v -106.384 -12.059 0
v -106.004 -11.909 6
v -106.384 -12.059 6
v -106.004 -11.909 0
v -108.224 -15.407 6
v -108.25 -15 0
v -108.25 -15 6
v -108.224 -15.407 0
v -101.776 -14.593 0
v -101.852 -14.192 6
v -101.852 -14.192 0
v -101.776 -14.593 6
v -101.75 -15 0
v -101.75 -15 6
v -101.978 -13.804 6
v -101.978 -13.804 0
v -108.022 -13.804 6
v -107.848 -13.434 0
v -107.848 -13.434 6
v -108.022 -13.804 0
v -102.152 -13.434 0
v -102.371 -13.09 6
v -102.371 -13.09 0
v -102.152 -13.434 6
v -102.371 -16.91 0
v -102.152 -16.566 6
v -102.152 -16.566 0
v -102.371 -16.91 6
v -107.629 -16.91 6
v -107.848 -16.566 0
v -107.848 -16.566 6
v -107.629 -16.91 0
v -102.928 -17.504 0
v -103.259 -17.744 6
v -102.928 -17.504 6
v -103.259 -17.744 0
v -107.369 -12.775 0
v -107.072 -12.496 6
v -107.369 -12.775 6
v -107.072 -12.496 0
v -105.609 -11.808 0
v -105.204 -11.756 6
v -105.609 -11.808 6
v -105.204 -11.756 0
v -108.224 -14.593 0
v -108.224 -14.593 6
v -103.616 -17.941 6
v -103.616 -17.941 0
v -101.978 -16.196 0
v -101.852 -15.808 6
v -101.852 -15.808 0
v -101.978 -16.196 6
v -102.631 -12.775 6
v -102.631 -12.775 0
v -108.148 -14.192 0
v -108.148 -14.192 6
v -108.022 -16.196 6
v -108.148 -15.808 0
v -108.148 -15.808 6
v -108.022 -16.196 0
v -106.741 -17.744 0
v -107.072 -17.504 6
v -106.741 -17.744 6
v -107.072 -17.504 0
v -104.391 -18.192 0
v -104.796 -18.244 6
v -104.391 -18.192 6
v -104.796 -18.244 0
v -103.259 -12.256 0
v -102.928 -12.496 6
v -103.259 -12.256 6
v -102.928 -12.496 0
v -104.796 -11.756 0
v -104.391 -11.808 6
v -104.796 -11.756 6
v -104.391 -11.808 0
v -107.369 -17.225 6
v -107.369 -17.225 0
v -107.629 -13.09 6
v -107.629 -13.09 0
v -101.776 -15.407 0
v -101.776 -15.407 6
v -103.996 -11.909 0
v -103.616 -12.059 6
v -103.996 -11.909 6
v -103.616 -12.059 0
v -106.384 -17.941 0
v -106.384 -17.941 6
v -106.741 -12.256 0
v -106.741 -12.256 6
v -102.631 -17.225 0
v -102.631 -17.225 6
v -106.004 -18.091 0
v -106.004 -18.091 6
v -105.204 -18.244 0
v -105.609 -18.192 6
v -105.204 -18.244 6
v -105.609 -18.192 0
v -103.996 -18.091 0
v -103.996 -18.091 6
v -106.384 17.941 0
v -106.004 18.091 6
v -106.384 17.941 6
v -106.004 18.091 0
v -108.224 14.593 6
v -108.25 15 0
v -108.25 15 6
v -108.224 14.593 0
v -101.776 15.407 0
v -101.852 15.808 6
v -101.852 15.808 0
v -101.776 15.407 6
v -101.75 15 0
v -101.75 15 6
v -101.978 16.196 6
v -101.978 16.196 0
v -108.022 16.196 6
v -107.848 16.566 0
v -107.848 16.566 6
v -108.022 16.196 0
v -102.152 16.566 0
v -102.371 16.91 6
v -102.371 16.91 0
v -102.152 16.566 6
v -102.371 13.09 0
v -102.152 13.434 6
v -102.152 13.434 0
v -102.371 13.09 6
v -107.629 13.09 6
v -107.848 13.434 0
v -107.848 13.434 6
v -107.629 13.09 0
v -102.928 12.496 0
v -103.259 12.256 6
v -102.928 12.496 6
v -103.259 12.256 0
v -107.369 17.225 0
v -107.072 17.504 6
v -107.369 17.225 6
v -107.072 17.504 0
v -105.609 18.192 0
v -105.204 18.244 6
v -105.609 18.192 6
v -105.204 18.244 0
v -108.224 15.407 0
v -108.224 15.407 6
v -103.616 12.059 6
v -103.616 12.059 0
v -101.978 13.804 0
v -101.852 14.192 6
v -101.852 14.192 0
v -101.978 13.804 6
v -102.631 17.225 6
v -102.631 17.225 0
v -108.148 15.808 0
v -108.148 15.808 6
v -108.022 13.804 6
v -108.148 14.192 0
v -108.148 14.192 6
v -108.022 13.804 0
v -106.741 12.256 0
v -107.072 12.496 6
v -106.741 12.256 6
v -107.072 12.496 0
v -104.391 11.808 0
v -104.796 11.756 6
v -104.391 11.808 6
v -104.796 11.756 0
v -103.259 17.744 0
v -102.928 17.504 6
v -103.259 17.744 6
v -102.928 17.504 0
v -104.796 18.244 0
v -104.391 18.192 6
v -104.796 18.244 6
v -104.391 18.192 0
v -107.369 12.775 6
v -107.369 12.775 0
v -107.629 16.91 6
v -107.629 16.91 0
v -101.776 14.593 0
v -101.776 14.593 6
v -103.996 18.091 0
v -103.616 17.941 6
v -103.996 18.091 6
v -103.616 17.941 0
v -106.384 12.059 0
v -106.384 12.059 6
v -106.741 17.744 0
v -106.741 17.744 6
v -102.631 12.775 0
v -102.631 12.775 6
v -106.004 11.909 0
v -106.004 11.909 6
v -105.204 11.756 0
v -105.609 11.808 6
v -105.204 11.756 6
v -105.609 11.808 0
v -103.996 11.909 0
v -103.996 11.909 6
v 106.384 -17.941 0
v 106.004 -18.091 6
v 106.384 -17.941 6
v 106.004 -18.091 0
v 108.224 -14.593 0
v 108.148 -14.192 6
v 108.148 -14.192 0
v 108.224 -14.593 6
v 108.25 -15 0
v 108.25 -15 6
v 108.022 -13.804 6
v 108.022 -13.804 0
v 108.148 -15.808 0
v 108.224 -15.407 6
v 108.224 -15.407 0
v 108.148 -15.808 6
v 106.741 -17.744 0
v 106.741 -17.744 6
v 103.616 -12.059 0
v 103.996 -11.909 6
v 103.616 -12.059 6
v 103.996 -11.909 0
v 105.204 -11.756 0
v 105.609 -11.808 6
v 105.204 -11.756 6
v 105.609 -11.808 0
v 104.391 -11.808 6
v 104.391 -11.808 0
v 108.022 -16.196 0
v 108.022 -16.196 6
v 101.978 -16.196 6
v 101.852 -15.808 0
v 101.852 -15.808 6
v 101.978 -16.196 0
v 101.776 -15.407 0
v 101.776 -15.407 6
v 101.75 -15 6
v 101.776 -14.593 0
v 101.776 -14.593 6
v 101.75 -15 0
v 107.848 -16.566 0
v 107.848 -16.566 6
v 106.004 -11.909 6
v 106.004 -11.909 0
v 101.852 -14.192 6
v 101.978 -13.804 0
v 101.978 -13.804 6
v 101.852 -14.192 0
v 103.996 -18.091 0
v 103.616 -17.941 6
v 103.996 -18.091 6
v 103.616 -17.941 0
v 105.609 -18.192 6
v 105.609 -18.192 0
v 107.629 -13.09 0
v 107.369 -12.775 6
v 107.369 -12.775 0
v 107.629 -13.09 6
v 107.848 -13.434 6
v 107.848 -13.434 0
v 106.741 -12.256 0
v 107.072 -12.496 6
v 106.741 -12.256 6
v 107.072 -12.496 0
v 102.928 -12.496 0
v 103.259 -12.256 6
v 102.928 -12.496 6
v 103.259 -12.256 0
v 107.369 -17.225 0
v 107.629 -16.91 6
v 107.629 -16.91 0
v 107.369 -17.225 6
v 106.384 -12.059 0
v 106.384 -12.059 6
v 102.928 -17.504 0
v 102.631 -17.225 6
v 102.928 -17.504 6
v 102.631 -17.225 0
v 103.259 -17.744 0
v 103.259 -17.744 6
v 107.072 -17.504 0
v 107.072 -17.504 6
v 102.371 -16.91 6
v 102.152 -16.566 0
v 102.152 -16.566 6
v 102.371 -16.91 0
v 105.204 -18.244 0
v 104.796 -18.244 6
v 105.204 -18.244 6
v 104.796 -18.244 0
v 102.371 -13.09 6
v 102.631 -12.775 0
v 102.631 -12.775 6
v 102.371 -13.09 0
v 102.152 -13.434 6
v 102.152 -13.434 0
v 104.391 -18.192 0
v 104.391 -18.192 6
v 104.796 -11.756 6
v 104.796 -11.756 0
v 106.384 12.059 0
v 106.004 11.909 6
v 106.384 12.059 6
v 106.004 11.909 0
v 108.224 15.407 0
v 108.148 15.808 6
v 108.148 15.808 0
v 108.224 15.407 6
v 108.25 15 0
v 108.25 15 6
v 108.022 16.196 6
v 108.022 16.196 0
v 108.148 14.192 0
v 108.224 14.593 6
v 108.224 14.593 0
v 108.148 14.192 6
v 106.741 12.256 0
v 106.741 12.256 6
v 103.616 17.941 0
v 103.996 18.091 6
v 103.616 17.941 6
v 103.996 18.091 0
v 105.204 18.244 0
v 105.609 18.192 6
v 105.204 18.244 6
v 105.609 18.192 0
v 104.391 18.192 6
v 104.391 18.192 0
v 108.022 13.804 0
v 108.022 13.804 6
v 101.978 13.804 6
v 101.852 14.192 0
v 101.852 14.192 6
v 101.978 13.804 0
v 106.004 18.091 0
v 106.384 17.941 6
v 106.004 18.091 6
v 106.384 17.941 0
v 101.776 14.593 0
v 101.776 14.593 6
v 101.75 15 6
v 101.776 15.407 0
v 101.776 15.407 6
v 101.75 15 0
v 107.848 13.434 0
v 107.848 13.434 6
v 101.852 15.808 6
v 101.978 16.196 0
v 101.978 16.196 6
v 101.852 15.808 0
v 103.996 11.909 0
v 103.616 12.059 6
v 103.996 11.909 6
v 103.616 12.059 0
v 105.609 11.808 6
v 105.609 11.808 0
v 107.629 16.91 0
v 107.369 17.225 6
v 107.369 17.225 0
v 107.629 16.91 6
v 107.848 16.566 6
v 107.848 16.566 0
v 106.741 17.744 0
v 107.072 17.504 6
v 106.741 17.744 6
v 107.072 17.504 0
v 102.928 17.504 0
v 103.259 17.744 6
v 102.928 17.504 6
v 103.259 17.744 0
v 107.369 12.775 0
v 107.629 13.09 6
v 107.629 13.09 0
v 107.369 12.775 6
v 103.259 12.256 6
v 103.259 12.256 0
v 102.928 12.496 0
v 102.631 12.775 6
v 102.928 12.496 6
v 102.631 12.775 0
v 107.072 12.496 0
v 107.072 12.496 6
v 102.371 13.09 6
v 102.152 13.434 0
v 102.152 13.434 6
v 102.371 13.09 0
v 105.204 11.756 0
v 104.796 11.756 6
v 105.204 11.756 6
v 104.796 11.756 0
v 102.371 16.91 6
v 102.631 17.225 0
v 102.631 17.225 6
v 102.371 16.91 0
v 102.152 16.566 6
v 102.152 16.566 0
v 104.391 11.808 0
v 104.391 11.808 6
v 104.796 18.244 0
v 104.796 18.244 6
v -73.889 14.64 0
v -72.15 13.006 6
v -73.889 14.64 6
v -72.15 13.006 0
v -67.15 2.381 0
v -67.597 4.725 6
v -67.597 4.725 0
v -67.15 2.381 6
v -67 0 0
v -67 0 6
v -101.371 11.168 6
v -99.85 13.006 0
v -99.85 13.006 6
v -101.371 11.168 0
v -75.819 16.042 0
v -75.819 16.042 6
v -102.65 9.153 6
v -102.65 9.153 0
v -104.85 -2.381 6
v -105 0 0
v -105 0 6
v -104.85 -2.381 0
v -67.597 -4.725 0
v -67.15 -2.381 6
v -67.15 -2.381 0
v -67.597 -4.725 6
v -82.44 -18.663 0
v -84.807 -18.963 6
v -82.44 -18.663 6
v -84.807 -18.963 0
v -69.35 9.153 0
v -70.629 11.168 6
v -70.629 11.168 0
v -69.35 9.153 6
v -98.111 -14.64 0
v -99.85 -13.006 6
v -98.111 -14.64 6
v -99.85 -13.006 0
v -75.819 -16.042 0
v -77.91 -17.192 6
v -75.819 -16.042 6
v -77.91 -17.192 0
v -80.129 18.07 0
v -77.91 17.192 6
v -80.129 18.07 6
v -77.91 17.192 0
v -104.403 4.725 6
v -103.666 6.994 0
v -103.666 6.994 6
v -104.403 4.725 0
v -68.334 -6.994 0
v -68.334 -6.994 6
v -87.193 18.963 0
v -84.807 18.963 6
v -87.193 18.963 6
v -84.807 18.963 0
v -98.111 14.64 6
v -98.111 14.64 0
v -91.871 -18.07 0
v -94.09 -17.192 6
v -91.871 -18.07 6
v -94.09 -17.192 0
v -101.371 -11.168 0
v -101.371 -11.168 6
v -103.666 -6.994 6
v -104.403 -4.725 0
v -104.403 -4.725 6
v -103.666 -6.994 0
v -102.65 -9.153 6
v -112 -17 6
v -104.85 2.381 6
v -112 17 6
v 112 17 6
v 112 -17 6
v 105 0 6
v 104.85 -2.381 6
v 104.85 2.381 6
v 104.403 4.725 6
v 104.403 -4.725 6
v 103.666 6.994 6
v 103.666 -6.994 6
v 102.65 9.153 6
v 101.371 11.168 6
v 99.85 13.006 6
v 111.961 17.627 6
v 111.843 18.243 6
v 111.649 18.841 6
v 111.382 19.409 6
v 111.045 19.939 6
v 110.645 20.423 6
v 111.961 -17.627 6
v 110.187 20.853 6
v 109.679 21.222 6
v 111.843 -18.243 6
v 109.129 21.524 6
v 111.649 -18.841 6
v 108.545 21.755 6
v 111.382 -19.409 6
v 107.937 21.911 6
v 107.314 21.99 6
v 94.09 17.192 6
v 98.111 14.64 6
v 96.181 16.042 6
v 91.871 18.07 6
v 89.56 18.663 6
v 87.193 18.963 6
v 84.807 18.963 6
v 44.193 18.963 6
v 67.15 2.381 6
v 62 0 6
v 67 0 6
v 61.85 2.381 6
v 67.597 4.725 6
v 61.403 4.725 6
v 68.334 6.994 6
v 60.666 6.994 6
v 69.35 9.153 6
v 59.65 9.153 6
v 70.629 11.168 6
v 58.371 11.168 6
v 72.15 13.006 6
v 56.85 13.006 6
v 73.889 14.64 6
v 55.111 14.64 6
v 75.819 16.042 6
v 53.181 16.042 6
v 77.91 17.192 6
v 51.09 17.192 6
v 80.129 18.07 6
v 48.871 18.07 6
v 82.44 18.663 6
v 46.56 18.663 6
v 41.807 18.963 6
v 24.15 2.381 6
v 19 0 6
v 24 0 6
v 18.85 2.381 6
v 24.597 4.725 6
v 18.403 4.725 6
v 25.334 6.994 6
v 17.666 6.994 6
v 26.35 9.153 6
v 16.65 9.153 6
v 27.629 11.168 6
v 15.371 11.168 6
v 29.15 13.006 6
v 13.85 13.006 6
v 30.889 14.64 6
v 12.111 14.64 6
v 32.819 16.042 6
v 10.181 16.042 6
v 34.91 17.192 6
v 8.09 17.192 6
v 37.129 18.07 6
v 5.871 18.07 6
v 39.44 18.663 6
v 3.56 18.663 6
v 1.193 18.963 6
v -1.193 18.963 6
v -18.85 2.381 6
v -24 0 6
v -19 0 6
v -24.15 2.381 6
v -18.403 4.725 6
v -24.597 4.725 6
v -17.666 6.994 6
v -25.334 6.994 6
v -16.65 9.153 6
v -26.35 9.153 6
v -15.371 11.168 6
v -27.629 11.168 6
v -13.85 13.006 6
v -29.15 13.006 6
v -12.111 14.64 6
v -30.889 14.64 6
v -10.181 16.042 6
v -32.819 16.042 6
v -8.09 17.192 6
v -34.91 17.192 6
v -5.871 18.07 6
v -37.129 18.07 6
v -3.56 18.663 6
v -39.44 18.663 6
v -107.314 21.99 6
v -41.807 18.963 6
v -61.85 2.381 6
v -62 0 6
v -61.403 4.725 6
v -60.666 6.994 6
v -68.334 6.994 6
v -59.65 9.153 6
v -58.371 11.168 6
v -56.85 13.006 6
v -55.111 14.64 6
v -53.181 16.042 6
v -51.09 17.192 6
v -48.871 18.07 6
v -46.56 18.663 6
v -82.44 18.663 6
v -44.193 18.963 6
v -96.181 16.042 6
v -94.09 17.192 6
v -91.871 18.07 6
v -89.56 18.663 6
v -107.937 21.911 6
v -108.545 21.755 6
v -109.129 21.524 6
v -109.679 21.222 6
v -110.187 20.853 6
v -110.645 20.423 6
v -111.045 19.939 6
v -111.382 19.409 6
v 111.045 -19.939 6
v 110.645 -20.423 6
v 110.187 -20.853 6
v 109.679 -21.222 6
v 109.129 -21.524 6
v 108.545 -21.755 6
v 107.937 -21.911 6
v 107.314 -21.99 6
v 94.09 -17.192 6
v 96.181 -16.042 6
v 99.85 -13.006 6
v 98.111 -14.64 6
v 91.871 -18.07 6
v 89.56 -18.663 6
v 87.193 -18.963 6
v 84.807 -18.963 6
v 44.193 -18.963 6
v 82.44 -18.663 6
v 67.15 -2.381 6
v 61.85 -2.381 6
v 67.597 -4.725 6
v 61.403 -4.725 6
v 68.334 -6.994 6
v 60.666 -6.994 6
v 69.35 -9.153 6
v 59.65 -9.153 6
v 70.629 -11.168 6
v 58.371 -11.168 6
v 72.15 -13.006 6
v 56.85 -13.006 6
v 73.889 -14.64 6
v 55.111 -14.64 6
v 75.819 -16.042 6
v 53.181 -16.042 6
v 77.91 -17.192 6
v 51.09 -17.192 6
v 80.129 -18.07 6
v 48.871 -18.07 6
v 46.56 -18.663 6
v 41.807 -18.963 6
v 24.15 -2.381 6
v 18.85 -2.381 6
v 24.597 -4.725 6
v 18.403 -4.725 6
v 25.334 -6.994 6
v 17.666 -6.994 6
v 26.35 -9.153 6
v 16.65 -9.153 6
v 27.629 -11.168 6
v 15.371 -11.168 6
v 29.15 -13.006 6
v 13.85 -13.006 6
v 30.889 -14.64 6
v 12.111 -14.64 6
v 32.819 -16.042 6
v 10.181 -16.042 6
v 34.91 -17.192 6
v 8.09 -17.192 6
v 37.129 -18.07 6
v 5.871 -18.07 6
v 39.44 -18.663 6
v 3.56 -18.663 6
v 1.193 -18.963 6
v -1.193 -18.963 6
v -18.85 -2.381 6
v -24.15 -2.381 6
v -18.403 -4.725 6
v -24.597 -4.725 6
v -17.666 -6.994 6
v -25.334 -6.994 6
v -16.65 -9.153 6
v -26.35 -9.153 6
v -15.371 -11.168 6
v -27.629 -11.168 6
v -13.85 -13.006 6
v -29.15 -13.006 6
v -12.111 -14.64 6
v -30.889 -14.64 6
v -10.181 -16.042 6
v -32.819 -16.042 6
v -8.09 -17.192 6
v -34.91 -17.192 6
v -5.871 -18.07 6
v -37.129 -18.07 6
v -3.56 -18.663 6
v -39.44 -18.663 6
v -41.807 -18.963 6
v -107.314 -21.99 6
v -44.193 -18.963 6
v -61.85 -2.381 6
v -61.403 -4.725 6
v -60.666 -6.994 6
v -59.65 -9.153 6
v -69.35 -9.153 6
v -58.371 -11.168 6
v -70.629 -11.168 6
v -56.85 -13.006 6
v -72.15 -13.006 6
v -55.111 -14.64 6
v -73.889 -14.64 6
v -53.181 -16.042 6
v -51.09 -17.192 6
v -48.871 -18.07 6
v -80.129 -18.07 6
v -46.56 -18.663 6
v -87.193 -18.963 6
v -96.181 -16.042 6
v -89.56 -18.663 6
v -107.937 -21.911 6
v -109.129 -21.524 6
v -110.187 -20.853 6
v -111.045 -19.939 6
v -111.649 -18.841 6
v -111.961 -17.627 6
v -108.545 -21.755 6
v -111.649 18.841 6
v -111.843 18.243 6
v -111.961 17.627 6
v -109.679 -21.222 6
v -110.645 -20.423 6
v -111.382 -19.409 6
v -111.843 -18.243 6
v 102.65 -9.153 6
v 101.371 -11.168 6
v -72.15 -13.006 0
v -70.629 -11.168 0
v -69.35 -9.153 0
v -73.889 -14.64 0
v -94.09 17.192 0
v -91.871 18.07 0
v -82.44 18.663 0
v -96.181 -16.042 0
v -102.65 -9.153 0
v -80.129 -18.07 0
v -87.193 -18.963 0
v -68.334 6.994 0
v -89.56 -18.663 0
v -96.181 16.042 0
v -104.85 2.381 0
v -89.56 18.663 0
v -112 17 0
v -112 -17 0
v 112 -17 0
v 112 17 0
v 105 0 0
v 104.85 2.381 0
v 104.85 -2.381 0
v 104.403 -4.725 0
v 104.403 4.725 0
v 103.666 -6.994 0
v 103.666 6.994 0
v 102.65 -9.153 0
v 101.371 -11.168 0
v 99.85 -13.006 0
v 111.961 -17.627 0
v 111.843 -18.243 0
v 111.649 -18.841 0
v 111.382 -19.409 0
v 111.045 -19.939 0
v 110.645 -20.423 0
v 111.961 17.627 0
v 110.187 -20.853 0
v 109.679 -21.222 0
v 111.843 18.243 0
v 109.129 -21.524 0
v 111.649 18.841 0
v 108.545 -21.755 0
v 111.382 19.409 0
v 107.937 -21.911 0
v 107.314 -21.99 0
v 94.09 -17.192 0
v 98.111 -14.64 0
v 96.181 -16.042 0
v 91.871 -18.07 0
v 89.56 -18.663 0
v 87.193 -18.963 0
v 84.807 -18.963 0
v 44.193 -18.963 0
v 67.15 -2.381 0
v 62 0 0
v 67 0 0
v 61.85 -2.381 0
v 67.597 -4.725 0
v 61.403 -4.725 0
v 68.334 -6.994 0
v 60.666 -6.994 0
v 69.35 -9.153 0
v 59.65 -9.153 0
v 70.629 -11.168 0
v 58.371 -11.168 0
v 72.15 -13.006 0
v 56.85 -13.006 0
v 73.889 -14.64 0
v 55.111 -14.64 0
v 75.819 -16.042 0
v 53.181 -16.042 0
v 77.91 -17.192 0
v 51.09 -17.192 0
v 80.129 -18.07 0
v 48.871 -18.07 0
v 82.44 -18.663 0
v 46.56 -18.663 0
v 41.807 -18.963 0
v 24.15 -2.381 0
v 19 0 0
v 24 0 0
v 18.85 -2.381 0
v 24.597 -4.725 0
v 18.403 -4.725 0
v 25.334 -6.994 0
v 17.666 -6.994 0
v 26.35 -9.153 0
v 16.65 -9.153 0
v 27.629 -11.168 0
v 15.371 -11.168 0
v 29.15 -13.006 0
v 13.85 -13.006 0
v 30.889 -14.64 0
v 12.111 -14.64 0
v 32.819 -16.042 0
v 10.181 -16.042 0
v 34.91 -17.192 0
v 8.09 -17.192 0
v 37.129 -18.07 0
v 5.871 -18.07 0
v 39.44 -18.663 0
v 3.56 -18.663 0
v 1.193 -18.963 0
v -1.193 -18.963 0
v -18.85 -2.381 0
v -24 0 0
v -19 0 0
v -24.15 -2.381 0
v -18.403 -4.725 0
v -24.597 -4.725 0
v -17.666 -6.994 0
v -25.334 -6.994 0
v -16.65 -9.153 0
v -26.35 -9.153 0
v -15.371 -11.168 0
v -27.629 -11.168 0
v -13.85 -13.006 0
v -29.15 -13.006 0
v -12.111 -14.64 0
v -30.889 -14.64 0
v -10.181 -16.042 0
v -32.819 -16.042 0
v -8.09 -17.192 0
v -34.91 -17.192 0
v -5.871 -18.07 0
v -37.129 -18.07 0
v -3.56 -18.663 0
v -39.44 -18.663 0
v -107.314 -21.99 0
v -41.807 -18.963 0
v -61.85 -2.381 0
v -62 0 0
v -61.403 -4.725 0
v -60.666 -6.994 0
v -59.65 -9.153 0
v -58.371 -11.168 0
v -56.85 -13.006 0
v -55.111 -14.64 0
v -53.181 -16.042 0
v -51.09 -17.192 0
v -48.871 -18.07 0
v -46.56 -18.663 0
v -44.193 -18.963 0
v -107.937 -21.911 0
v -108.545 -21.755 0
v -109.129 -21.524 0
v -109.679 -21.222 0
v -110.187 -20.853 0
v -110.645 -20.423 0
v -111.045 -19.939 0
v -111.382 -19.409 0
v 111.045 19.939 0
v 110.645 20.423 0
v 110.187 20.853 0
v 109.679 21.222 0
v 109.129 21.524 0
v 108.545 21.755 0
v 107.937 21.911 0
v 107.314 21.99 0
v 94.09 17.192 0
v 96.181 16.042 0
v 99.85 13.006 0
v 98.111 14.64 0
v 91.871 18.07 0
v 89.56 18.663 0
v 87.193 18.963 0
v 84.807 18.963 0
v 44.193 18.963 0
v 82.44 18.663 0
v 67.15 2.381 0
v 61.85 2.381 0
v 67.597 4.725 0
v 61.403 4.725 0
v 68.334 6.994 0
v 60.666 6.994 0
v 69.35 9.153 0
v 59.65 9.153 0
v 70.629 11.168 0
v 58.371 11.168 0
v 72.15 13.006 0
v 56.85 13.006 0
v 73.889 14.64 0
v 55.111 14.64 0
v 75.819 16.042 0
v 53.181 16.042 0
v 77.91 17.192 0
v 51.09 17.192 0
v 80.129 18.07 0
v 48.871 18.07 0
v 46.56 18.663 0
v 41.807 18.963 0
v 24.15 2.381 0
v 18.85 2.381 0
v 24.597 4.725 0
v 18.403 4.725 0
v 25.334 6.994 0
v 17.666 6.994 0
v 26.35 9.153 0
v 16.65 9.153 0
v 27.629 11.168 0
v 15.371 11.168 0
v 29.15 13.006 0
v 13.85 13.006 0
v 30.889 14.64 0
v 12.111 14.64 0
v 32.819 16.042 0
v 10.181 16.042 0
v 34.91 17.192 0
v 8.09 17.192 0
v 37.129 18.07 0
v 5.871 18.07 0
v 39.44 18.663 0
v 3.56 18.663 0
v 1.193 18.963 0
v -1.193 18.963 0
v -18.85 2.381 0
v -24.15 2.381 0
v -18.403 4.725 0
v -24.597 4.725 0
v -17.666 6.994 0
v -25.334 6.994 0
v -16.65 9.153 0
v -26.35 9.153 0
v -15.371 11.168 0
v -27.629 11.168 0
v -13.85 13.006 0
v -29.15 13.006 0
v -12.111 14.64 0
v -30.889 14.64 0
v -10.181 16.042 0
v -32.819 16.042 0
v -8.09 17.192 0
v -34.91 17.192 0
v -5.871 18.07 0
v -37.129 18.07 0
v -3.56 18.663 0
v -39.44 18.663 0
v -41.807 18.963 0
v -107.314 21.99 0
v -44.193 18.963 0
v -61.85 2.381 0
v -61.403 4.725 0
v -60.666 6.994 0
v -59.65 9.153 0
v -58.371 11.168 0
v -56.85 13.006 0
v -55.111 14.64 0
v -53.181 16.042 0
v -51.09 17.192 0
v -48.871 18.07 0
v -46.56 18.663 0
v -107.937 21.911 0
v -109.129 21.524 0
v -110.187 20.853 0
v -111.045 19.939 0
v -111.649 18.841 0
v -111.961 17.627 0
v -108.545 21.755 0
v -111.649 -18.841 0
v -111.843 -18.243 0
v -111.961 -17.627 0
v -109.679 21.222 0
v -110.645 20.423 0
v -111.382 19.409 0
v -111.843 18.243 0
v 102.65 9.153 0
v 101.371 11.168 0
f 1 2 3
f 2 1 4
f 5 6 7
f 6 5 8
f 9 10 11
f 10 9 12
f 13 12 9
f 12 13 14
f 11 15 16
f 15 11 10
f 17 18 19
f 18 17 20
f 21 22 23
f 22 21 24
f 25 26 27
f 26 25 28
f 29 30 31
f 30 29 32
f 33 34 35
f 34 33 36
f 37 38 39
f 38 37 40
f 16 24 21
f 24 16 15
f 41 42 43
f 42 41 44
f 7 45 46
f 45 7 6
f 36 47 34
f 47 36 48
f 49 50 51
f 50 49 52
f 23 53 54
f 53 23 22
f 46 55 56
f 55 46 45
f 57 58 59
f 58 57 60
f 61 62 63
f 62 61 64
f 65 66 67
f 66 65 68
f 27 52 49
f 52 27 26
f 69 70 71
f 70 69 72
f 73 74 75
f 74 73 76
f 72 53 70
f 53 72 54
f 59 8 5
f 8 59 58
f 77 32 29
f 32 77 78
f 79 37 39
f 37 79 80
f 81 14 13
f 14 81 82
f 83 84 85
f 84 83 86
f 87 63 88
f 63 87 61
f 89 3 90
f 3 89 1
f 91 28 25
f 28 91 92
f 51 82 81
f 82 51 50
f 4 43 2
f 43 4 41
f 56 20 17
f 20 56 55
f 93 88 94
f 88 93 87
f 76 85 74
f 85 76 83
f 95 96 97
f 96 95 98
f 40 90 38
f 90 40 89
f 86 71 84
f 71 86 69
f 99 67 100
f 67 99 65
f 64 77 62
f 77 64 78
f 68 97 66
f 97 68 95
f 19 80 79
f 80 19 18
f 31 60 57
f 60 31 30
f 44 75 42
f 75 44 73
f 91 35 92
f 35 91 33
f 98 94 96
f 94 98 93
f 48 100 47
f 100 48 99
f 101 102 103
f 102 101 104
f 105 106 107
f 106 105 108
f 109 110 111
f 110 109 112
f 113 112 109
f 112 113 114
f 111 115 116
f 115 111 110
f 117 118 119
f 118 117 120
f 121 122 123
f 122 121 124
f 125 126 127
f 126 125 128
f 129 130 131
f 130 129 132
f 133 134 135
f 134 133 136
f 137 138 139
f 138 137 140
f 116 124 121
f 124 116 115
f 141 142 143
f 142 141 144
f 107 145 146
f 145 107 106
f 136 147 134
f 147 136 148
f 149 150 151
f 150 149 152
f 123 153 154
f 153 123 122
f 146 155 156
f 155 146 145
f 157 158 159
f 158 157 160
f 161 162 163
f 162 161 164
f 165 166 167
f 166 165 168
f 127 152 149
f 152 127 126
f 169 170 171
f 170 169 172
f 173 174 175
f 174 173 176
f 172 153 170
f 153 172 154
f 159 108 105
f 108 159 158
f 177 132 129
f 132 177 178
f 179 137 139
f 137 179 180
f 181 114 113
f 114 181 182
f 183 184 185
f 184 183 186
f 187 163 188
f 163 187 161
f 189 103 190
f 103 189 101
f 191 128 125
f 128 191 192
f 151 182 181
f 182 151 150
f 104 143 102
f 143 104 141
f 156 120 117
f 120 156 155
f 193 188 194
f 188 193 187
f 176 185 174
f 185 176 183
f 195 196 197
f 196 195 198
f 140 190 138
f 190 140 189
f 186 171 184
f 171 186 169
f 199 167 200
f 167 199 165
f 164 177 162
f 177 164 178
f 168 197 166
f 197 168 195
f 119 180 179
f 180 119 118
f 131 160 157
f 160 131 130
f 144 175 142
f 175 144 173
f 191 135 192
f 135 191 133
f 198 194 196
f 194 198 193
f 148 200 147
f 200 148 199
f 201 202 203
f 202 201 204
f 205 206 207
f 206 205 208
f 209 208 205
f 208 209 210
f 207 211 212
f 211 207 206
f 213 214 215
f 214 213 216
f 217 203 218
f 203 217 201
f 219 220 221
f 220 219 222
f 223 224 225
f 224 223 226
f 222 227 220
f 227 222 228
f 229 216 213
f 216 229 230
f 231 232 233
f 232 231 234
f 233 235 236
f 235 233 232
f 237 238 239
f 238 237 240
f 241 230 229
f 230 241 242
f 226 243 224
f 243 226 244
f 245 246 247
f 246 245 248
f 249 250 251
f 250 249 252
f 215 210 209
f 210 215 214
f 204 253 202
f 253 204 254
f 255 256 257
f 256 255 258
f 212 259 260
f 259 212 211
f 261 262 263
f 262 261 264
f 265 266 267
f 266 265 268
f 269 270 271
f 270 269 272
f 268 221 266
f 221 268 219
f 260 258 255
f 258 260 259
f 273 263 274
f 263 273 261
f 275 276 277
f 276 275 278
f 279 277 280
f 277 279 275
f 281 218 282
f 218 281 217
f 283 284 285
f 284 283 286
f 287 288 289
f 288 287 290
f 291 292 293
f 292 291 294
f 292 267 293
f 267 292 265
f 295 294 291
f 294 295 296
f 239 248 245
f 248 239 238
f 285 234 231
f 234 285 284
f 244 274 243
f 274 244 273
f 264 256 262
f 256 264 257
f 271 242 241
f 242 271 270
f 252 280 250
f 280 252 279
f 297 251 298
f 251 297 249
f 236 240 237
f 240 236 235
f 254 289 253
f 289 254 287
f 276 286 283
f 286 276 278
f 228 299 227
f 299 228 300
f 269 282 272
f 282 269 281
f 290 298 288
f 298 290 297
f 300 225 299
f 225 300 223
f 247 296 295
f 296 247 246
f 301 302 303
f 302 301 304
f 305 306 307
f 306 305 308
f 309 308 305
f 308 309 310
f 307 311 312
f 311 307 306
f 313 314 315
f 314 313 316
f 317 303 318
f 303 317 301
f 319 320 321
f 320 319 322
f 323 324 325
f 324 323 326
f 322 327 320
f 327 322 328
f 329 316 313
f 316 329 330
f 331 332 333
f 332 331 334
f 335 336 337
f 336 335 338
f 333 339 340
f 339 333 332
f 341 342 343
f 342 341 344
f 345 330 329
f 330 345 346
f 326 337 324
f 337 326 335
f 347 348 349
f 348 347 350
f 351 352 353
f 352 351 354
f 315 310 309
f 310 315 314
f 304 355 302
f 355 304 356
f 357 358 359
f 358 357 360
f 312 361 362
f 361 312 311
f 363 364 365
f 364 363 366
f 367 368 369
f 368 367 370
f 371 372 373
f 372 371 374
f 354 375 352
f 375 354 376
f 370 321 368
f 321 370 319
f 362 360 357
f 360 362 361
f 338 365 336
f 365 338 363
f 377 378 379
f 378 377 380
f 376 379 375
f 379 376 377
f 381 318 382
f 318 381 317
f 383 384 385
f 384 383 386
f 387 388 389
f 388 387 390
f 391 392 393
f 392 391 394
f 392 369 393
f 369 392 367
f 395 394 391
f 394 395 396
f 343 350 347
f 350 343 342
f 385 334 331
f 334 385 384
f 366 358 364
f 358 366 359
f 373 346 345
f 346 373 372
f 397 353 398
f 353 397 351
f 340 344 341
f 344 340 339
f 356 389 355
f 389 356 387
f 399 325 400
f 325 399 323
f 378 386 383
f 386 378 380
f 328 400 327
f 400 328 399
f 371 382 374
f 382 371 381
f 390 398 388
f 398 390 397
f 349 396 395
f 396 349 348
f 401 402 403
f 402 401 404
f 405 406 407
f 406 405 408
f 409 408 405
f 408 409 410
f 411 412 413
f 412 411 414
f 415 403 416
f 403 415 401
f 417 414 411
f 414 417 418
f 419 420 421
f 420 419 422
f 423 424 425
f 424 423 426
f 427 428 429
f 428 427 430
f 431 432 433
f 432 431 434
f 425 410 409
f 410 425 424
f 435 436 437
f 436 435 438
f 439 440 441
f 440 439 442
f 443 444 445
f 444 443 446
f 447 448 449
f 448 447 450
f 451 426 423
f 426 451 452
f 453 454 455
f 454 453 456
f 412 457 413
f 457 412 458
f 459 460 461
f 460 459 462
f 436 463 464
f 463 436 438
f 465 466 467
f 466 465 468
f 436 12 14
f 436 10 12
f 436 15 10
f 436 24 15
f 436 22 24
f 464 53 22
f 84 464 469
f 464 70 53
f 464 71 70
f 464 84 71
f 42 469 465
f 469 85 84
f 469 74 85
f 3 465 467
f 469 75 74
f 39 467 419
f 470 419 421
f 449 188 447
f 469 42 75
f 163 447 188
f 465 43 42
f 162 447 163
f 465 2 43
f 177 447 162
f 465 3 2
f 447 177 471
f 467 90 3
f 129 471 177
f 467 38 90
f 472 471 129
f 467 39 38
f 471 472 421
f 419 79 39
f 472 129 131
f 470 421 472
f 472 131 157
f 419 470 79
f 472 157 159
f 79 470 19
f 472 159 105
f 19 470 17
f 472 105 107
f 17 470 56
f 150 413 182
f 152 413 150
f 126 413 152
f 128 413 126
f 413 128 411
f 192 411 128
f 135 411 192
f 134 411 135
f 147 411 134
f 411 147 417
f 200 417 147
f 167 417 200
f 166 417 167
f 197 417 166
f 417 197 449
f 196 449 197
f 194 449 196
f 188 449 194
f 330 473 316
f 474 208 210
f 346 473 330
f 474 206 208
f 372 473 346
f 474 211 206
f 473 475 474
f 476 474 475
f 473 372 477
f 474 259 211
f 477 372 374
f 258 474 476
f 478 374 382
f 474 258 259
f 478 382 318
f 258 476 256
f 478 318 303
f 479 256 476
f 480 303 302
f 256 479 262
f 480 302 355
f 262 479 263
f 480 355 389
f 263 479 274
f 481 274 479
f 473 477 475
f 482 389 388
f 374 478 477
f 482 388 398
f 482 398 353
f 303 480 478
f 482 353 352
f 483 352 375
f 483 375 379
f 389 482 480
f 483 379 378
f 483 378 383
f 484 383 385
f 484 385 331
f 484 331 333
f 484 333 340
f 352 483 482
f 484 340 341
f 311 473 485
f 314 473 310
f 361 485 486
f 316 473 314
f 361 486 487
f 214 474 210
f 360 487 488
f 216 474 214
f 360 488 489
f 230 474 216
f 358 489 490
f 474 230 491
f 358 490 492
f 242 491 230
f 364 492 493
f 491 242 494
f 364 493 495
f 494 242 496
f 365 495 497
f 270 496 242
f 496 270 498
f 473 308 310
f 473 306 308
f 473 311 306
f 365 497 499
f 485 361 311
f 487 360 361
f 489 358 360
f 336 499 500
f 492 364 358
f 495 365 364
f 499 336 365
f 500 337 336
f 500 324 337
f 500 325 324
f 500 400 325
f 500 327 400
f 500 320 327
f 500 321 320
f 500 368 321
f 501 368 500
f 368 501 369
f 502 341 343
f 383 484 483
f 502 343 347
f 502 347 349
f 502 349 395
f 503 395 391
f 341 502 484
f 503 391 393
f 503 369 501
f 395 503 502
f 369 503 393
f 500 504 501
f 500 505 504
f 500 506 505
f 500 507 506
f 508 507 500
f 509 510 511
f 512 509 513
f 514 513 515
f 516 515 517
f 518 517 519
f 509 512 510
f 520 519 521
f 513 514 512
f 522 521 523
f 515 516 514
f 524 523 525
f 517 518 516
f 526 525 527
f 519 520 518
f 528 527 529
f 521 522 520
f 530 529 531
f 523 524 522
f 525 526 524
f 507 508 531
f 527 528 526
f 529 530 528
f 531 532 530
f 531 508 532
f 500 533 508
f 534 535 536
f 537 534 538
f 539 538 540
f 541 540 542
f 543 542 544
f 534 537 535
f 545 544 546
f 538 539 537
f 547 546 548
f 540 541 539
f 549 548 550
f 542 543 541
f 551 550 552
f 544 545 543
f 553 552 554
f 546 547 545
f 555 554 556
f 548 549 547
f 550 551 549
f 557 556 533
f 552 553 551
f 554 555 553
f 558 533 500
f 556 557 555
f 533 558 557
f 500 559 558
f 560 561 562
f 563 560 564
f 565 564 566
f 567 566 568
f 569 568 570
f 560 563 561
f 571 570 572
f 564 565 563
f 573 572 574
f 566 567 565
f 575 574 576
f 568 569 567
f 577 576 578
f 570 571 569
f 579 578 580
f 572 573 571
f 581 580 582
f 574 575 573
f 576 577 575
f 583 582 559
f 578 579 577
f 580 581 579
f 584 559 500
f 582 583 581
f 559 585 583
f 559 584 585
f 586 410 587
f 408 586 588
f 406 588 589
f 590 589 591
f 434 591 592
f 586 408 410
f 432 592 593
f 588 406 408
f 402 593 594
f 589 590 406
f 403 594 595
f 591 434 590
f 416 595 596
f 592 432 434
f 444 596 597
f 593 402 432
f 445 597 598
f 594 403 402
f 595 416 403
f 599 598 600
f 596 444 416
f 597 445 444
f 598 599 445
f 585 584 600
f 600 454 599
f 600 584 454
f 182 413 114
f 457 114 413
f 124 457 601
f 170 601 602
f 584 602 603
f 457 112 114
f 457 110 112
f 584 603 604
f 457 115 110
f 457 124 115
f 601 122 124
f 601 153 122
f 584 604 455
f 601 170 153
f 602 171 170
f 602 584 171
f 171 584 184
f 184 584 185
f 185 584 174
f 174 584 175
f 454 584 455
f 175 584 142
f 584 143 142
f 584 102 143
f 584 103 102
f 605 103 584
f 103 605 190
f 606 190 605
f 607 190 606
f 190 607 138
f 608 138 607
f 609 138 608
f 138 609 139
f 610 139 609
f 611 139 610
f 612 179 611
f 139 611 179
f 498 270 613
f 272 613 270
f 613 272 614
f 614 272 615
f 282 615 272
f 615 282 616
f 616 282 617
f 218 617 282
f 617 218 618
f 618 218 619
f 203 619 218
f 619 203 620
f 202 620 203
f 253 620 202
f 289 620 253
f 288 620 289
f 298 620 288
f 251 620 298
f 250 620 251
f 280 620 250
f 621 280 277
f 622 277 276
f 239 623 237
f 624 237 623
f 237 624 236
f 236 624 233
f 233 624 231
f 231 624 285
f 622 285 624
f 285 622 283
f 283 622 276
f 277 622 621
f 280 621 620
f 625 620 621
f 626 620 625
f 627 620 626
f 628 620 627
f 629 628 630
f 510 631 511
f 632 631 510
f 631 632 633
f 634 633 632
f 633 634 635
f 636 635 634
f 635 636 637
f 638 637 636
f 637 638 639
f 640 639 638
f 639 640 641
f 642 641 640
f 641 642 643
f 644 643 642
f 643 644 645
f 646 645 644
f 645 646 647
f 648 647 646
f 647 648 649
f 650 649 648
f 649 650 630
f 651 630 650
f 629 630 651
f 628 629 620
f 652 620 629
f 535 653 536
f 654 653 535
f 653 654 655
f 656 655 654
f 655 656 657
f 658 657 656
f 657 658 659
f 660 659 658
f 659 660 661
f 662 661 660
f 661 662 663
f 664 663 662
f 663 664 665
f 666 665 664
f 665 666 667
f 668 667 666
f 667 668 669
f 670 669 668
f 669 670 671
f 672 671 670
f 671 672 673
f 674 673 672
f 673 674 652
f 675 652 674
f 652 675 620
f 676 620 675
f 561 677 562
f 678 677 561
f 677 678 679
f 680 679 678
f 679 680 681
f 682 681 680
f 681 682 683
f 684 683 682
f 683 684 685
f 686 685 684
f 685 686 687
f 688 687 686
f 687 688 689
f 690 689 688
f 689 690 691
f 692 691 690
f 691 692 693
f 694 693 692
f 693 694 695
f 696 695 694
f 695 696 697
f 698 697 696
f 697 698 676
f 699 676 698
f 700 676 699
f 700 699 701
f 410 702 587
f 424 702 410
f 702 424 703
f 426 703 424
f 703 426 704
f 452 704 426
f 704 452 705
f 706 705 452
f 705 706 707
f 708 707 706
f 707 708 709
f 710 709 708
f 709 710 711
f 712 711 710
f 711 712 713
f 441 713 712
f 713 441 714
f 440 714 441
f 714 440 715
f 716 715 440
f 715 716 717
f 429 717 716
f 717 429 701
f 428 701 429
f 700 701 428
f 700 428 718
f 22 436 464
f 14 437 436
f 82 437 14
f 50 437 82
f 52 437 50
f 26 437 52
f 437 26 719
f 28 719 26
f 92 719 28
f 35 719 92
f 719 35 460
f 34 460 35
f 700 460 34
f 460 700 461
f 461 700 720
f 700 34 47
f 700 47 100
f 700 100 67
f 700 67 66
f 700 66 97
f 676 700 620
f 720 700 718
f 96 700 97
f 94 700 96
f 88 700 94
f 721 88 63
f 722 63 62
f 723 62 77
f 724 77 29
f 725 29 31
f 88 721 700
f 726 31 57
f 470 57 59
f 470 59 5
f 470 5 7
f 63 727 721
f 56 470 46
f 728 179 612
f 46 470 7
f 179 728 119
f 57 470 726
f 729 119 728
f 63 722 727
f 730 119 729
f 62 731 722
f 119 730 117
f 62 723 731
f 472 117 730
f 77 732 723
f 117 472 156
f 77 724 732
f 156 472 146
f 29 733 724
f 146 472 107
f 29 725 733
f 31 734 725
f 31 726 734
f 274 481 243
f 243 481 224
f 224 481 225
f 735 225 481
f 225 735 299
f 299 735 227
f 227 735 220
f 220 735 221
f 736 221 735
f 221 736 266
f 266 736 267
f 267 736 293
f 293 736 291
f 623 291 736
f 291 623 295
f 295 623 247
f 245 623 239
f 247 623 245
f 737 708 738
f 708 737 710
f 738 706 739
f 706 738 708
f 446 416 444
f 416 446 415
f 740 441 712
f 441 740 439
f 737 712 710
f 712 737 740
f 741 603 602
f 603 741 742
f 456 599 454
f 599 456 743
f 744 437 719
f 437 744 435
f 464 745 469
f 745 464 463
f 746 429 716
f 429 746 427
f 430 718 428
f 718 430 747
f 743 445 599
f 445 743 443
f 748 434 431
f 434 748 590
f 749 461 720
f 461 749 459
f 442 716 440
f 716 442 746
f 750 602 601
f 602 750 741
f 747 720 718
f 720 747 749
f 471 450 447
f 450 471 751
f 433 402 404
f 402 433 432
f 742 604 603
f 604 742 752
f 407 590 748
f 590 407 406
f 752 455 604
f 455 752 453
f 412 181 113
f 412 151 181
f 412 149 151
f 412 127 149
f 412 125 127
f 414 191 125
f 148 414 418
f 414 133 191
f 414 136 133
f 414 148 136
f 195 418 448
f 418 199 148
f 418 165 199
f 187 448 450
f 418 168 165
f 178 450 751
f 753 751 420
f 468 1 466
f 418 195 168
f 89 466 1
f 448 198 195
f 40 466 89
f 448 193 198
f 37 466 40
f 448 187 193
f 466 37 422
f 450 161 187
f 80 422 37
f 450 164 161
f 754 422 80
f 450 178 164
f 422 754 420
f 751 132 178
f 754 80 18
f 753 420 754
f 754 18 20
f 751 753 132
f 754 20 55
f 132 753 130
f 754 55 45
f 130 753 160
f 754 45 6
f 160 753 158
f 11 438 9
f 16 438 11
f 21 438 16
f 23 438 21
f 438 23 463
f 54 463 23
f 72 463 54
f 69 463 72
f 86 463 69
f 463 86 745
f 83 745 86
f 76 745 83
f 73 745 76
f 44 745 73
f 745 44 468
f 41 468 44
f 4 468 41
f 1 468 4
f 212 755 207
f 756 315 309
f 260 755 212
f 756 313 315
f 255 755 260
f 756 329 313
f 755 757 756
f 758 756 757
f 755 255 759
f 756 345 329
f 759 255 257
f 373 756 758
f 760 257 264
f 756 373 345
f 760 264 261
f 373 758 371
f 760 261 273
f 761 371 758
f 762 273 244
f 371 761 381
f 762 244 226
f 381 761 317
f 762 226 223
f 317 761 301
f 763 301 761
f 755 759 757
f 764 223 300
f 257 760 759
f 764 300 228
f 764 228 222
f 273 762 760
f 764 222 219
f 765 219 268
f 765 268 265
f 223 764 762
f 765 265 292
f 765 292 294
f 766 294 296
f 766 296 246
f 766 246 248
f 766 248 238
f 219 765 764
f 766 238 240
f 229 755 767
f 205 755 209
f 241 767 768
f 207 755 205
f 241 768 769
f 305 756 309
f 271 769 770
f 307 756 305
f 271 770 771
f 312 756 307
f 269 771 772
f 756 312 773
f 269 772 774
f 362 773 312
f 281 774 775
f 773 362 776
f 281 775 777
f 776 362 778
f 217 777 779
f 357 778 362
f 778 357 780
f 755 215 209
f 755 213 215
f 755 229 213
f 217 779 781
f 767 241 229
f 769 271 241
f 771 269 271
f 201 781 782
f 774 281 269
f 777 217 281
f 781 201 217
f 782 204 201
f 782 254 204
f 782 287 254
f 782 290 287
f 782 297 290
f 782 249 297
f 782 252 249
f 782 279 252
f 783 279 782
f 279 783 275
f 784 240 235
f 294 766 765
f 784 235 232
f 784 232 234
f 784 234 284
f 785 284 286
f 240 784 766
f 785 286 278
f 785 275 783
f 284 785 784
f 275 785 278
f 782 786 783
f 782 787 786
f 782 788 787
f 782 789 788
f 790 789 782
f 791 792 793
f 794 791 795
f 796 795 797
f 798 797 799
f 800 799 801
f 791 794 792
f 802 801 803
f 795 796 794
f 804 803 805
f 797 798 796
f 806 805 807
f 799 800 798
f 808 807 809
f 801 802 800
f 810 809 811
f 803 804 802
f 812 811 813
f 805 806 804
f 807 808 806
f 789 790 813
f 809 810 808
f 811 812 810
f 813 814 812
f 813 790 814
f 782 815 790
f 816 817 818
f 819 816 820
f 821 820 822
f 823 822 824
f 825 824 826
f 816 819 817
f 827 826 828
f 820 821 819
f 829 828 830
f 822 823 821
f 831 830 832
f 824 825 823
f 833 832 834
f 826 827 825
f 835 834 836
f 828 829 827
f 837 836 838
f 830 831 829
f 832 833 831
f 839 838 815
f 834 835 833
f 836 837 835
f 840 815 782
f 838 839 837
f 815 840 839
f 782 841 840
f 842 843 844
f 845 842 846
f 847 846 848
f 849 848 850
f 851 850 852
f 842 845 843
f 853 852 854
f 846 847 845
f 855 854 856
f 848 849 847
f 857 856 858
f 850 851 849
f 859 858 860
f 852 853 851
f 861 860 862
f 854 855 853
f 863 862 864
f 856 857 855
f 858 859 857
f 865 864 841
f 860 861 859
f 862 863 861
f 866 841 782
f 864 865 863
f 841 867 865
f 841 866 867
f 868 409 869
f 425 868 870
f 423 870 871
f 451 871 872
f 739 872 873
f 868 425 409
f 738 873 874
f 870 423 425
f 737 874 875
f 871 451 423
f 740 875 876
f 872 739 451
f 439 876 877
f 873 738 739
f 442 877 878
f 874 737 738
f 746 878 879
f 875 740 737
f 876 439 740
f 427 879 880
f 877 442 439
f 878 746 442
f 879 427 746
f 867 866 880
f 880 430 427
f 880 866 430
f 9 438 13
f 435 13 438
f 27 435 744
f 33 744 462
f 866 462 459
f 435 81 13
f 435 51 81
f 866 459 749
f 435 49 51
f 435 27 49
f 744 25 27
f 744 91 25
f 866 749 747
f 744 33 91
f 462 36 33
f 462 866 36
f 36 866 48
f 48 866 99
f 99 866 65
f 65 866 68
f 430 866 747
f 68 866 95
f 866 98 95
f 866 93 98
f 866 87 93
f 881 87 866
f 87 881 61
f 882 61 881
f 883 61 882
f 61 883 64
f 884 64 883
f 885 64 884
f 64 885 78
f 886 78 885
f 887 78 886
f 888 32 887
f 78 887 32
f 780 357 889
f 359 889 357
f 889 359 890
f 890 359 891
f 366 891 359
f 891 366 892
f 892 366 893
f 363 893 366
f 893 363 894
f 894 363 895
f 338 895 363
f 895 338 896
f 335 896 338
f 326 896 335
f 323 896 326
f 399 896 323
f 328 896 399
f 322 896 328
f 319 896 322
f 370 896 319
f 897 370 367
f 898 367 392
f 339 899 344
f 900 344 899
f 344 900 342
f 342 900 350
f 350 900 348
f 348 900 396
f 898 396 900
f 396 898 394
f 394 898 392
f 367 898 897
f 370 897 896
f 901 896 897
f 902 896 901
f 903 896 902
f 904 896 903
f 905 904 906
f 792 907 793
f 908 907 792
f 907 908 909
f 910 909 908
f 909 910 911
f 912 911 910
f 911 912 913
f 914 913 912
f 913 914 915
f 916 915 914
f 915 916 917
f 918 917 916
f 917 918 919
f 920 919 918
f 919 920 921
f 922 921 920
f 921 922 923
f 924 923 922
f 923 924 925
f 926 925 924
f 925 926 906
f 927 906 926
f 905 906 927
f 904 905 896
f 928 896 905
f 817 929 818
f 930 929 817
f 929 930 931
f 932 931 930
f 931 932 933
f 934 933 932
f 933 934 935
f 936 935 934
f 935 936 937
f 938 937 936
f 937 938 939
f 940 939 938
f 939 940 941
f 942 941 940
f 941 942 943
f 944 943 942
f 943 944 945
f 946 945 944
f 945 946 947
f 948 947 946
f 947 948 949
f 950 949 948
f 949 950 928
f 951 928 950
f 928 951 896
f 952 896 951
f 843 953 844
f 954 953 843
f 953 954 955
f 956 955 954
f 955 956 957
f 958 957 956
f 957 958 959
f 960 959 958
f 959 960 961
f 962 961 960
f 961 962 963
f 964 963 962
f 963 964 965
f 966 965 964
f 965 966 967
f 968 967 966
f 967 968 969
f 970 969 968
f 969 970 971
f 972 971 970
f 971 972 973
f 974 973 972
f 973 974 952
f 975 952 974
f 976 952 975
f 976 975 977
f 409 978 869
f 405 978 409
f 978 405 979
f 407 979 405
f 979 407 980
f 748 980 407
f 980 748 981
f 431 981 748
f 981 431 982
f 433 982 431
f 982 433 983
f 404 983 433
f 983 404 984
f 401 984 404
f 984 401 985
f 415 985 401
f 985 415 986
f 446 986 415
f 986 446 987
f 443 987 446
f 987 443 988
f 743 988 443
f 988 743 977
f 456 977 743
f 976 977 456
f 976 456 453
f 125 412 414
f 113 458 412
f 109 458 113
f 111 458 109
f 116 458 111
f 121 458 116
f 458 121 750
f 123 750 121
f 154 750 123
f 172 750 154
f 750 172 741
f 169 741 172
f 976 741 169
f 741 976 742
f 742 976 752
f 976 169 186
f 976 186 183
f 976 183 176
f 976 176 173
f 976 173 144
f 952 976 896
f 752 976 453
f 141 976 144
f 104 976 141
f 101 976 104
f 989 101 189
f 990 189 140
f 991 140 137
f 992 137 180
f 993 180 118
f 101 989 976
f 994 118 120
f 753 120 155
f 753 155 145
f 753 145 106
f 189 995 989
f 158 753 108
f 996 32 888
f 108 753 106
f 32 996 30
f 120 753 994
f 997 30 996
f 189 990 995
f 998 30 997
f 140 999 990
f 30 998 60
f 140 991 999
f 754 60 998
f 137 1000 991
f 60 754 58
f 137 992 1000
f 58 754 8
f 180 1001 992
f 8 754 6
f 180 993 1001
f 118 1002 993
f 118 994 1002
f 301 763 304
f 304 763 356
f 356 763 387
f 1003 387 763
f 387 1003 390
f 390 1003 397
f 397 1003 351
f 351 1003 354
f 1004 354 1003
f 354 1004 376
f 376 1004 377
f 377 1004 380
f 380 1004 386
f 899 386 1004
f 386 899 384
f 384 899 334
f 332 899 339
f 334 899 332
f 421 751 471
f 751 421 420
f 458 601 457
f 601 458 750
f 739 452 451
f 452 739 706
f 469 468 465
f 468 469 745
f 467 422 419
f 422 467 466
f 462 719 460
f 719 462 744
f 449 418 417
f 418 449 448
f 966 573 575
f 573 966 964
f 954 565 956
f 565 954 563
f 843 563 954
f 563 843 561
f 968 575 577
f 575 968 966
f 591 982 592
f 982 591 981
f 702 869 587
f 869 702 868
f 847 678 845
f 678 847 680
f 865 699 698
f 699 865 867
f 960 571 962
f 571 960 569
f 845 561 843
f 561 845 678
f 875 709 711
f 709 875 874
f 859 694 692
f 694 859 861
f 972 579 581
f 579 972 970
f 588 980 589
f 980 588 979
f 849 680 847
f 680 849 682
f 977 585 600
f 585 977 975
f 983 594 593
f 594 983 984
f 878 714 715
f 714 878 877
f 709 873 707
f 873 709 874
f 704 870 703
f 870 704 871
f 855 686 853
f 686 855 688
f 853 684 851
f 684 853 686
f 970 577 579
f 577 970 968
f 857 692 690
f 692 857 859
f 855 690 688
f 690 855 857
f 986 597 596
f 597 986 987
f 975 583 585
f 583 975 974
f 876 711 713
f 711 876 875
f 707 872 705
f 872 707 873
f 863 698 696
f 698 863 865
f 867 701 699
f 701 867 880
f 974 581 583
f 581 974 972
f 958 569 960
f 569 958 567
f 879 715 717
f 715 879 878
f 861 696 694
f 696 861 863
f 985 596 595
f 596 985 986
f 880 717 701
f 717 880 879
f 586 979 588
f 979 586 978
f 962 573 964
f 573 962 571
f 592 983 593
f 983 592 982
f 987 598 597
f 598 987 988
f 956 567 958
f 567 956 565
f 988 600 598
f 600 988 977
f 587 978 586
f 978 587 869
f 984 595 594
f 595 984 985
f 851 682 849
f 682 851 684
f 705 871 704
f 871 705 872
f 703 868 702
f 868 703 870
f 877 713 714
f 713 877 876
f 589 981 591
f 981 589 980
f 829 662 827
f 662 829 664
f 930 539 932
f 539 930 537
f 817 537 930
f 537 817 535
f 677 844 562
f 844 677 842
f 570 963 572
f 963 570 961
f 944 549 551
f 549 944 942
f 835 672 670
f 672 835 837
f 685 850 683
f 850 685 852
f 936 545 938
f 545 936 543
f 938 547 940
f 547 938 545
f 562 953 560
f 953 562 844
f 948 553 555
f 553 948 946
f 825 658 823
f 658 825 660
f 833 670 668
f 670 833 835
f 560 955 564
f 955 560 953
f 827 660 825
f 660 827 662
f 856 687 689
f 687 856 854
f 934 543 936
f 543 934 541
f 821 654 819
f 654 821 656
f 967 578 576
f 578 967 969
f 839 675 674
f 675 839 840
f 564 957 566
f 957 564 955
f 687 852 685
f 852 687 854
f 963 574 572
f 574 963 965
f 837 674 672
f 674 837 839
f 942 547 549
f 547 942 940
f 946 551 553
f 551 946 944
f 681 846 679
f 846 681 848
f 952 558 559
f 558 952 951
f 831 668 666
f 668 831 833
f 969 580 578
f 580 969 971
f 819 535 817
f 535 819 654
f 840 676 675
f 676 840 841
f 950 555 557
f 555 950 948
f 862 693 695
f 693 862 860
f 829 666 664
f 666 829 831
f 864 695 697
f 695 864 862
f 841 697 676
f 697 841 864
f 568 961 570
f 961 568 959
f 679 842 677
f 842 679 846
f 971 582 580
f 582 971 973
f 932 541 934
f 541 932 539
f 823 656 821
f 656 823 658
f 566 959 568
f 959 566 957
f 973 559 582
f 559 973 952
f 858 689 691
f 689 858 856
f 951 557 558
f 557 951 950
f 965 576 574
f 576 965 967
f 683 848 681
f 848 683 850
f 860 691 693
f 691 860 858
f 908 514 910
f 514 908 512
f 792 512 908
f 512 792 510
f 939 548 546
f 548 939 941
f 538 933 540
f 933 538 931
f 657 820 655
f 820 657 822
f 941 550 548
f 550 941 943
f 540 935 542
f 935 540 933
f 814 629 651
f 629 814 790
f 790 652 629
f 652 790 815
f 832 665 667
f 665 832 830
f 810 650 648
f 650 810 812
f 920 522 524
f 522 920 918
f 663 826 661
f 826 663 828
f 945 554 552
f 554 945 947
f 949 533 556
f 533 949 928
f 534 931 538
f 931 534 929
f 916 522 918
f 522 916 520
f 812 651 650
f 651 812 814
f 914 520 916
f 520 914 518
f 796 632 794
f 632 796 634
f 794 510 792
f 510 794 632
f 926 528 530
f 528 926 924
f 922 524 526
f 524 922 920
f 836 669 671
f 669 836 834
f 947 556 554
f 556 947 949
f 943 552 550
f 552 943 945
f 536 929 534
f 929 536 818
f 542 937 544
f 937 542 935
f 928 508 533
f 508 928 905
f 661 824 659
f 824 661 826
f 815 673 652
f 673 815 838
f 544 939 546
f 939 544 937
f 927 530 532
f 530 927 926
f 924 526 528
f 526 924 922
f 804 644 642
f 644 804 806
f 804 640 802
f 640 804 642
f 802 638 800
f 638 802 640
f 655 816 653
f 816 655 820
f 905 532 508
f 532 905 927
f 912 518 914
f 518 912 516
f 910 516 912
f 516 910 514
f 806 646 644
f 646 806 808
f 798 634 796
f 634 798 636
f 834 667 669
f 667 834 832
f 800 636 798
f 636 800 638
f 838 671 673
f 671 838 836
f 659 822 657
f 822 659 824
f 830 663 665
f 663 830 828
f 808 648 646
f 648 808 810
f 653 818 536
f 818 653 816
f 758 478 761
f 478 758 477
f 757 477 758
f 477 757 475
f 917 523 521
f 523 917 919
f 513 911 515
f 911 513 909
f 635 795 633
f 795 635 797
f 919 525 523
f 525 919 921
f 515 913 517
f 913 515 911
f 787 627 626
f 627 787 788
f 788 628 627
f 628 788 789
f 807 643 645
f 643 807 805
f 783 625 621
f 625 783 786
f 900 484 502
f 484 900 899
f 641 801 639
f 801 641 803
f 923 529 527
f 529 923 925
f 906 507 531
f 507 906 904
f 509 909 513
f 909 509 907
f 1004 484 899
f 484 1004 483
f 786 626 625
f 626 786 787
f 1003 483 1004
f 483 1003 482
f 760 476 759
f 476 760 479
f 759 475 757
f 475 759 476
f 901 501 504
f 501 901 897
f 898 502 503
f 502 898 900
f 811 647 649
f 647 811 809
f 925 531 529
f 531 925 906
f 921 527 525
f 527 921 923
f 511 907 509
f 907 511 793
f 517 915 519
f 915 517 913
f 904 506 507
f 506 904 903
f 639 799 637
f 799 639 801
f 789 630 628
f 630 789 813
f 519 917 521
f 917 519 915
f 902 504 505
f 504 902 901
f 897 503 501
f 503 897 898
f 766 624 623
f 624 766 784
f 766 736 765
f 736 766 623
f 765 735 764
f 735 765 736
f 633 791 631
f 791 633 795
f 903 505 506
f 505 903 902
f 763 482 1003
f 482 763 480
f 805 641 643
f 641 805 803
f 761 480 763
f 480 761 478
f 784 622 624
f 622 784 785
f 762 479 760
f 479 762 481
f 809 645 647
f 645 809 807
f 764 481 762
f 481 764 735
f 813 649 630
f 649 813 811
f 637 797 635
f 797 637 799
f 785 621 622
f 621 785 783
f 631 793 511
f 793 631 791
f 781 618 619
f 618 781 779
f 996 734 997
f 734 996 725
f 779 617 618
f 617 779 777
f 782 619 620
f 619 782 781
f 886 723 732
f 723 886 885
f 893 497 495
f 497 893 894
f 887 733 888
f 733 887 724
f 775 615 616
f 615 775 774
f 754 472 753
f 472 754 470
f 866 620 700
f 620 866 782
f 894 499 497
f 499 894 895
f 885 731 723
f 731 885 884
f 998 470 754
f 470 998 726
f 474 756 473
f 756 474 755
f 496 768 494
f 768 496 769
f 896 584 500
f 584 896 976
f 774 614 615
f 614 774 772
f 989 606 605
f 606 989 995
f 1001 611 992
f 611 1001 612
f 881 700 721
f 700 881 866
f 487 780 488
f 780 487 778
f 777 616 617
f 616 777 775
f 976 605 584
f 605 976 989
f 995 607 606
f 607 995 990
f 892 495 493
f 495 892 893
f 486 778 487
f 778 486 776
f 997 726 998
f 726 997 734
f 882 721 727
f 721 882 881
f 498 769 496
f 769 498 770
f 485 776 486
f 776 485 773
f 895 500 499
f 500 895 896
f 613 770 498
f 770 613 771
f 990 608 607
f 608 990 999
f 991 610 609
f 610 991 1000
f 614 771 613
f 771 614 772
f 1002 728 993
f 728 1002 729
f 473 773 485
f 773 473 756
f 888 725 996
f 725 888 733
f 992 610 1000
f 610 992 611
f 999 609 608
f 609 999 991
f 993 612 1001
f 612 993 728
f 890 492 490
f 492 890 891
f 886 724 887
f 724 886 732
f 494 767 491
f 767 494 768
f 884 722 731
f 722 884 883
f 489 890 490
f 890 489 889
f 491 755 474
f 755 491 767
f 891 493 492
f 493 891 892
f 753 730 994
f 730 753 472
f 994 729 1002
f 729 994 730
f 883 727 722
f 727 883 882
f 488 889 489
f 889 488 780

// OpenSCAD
$fn = 50;

difference() {
	union() {
		hull() {
			translate(v = [-107.0, 17.0, 0]) {
				cylinder(h = 6, r = 5);
			}
			translate(v = [107.0, 17.0, 0]) {
				cylinder(h = 6, r = 5);
			}
			translate(v = [-107.0, -17.0, 0]) {
				cylinder(h = 6, r = 5);
			}
			translate(v = [107.0, -17.0, 0]) {
				cylinder(h = 6, r = 5);
			}
		}
	}
	union() {
		translate(v = [-105.0, -15.0, -100.0]) {
			cylinder(h = 200, r = 3.25);
		}
		translate(v = [-105.0, 15.0, -100.0]) {
			cylinder(h = 200, r = 3.25);
		}
		translate(v = [105.0, -15.0, -100.0]) {
			cylinder(h = 200, r = 3.25);
		}
		translate(v = [105.0, 15.0, -100.0]) {
			cylinder(h = 200, r = 3.25);
		}
		translate(v = [-105.0, -15.0, -100.0]) {
			cylinder(h = 200, r = 1.8);
		}
		translate(v = [-105.0, 15.0, -100.0]) {
			cylinder(h = 200, r = 1.8);
		}
		translate(v = [105.0, -15.0, -100.0]) {
			cylinder(h = 200, r = 1.8);
		}
		translate(v = [105.0, 15.0, -100.0]) {
			cylinder(h = 200, r = 1.8);
		}
		translate(v = [-86.0, 0, 0.0]) {
			cylinder(h = 6, r = 19.0);
		}
		translate(v = [-43.0, 0, 0.0]) {
			cylinder(h = 6, r = 19.0);
		}
		cylinder(h = 6, r = 19.0);
		translate(v = [43.0, 0, 0.0]) {
			cylinder(h = 6, r = 19.0);
		}
		translate(v = [86.0, 0, 0.0]) {
			cylinder(h = 6, r = 19.0);
		}
	}
}
